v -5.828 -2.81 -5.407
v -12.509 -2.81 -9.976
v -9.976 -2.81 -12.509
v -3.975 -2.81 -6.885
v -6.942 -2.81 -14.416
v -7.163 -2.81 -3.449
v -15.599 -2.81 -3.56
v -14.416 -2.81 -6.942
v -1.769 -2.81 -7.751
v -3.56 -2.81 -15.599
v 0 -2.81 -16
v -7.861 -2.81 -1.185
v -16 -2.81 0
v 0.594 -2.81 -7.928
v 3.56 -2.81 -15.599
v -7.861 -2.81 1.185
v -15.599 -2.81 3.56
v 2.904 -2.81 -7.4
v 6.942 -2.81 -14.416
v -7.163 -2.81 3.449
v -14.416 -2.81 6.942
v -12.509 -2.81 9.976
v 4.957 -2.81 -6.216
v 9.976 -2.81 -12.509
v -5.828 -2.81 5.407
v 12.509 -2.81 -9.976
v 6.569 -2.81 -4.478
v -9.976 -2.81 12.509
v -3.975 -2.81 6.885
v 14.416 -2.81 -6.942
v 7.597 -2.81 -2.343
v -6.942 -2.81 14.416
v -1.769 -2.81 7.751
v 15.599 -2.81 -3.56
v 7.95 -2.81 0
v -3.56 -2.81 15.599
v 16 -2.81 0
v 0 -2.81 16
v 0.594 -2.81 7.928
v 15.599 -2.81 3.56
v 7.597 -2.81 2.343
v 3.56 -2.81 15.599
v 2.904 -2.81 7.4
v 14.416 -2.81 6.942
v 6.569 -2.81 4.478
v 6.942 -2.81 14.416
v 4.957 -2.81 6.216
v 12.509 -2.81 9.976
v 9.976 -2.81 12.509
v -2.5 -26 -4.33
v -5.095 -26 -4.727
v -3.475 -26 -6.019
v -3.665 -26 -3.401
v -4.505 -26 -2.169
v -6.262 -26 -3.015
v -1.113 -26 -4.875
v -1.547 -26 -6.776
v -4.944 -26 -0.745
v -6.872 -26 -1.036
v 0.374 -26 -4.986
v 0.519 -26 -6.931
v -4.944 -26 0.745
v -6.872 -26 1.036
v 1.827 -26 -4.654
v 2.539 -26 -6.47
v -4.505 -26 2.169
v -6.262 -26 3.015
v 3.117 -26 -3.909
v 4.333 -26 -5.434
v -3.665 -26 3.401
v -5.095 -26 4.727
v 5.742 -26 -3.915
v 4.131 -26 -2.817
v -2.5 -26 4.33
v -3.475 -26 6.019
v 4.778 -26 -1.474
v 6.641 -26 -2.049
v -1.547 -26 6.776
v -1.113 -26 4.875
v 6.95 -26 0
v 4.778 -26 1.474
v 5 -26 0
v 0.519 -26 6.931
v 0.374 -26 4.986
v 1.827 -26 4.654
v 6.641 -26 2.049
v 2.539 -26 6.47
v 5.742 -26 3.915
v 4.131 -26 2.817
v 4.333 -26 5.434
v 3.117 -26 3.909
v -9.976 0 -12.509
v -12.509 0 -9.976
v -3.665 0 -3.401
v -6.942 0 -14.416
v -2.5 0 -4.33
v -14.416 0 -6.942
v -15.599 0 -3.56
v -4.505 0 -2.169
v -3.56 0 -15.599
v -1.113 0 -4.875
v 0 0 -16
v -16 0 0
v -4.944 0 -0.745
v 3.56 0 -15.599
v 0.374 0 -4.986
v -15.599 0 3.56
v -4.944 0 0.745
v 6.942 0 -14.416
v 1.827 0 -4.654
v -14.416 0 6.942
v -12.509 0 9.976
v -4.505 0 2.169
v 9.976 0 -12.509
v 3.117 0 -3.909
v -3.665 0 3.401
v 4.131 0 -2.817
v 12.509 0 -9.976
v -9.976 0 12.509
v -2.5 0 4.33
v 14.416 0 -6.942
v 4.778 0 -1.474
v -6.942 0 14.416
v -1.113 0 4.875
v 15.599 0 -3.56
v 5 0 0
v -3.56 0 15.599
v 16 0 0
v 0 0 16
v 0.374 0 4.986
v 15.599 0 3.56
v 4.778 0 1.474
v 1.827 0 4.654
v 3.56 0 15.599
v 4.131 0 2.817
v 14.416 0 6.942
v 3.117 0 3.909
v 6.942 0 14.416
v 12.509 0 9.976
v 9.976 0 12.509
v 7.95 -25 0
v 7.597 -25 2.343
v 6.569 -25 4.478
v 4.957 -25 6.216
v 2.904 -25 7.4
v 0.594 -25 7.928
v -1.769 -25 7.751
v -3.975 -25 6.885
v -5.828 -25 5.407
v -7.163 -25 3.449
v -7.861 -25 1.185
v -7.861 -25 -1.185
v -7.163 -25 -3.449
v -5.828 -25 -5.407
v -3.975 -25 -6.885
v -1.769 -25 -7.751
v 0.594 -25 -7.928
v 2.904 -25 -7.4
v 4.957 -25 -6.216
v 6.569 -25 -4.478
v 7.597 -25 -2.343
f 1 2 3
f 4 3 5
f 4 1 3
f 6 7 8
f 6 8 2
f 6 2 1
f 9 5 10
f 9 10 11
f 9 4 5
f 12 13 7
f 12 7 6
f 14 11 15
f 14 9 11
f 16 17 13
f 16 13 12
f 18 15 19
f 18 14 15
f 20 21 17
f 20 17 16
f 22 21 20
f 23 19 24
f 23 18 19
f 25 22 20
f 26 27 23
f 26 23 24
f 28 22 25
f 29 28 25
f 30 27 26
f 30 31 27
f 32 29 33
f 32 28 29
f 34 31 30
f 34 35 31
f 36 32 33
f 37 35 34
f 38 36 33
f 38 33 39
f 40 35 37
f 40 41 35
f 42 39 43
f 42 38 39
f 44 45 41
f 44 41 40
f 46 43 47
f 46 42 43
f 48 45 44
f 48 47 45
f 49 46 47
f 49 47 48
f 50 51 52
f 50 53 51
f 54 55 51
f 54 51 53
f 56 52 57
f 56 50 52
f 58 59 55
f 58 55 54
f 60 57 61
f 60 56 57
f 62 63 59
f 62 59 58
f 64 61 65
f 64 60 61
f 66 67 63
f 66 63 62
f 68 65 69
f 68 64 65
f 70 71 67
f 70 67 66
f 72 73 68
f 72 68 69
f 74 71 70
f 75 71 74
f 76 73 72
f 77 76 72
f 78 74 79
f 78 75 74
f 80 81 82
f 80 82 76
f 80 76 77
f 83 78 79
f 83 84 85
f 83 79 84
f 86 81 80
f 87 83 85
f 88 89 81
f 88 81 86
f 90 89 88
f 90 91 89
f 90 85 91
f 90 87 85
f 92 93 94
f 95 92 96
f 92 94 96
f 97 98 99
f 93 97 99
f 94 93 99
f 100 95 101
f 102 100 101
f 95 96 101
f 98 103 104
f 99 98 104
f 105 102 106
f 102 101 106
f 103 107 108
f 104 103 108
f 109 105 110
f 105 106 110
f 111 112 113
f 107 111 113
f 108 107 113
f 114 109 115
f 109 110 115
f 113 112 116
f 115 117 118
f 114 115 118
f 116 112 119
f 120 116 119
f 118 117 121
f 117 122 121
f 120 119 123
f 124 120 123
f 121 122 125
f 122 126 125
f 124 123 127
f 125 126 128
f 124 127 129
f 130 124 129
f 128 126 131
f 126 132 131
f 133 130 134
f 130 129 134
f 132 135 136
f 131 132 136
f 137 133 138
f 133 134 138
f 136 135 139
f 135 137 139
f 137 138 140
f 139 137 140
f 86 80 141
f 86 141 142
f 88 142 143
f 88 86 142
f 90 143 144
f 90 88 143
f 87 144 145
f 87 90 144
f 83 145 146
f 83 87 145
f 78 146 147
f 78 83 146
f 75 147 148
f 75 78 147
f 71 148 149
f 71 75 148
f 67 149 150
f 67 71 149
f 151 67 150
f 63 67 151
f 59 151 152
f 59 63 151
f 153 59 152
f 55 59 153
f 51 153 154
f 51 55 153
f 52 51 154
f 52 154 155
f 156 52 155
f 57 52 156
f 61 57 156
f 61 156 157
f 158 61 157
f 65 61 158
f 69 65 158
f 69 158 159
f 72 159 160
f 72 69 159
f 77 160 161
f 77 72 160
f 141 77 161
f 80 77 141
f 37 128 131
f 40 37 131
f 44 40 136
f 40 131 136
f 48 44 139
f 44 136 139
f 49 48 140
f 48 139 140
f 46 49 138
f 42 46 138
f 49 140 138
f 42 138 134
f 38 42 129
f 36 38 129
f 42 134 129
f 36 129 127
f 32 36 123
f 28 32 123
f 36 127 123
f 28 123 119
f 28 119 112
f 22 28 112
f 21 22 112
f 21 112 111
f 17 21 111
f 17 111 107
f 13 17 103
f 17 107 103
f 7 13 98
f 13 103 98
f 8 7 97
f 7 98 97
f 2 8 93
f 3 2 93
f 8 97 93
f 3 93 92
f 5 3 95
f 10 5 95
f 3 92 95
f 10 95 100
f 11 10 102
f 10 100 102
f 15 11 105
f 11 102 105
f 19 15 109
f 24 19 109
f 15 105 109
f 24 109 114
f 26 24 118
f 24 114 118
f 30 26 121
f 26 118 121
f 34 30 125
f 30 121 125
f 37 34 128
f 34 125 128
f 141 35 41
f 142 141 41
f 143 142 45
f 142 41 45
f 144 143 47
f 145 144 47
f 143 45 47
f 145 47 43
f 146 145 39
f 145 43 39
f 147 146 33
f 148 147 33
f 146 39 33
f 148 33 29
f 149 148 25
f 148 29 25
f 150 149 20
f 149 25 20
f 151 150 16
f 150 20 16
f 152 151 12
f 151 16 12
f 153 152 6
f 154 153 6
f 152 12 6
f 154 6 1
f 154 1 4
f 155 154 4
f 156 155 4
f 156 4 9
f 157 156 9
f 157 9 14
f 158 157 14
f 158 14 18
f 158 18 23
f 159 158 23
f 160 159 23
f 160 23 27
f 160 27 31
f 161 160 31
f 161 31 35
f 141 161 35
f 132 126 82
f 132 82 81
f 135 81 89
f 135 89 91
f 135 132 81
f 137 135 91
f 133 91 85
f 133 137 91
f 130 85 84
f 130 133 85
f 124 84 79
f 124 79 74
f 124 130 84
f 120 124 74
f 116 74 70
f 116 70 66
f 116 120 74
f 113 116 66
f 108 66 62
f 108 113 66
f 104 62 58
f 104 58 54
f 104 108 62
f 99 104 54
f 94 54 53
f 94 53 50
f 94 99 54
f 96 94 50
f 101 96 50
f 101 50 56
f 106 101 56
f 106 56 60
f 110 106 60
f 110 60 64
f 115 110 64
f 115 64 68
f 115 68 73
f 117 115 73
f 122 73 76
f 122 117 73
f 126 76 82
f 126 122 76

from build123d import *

# Parameters (mm, degrees)
F0_R     = 7.95
F0_R_2   = 5
F1_DEPTH = 26
F0_R_3   = 16
F2_DEPTH = 2.81
F3_SIZE  = 1


with BuildPart() as f1:
    # F0 (on Front) → F1 (new body)
    with BuildSketch(Plane.XZ):
        Circle(F0_R)
        Circle(F0_R_2, mode=Mode.SUBTRACT)
    extrude(amount=F1_DEPTH)

    # F0 (on Front) → F2 (join)
    with BuildSketch(Plane.XZ):
        Circle(F0_R_3)
        Circle(F0_R, mode=Mode.SUBTRACT)
    extrude(amount=F2_DEPTH)

    # F3
    f3_edges = [f1.edges().sort_by_distance(p)[0] for p in [
        (-7.95, -26, 0),
    ]]
    chamfer(f3_edges, length=F3_SIZE)


solid = f1.part
